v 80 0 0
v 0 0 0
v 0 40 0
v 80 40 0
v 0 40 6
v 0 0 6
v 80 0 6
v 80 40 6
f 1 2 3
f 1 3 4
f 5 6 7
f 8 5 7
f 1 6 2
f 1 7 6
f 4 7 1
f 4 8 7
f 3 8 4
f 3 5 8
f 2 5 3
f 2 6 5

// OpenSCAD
module solid() {
    // First rectangle
    polygon(points=[[0,0],[80,0],[80,40],[0,40]]);
    
    // Second rectangle with holes
    translate([25, 15]) {
        scale([1, 1, 1]) {
            polygon(points=[[0,0],[55,0],[55,25],[0,25]]);
        }
    }
}

linear_extrude(height=6) {
    solid();
}
